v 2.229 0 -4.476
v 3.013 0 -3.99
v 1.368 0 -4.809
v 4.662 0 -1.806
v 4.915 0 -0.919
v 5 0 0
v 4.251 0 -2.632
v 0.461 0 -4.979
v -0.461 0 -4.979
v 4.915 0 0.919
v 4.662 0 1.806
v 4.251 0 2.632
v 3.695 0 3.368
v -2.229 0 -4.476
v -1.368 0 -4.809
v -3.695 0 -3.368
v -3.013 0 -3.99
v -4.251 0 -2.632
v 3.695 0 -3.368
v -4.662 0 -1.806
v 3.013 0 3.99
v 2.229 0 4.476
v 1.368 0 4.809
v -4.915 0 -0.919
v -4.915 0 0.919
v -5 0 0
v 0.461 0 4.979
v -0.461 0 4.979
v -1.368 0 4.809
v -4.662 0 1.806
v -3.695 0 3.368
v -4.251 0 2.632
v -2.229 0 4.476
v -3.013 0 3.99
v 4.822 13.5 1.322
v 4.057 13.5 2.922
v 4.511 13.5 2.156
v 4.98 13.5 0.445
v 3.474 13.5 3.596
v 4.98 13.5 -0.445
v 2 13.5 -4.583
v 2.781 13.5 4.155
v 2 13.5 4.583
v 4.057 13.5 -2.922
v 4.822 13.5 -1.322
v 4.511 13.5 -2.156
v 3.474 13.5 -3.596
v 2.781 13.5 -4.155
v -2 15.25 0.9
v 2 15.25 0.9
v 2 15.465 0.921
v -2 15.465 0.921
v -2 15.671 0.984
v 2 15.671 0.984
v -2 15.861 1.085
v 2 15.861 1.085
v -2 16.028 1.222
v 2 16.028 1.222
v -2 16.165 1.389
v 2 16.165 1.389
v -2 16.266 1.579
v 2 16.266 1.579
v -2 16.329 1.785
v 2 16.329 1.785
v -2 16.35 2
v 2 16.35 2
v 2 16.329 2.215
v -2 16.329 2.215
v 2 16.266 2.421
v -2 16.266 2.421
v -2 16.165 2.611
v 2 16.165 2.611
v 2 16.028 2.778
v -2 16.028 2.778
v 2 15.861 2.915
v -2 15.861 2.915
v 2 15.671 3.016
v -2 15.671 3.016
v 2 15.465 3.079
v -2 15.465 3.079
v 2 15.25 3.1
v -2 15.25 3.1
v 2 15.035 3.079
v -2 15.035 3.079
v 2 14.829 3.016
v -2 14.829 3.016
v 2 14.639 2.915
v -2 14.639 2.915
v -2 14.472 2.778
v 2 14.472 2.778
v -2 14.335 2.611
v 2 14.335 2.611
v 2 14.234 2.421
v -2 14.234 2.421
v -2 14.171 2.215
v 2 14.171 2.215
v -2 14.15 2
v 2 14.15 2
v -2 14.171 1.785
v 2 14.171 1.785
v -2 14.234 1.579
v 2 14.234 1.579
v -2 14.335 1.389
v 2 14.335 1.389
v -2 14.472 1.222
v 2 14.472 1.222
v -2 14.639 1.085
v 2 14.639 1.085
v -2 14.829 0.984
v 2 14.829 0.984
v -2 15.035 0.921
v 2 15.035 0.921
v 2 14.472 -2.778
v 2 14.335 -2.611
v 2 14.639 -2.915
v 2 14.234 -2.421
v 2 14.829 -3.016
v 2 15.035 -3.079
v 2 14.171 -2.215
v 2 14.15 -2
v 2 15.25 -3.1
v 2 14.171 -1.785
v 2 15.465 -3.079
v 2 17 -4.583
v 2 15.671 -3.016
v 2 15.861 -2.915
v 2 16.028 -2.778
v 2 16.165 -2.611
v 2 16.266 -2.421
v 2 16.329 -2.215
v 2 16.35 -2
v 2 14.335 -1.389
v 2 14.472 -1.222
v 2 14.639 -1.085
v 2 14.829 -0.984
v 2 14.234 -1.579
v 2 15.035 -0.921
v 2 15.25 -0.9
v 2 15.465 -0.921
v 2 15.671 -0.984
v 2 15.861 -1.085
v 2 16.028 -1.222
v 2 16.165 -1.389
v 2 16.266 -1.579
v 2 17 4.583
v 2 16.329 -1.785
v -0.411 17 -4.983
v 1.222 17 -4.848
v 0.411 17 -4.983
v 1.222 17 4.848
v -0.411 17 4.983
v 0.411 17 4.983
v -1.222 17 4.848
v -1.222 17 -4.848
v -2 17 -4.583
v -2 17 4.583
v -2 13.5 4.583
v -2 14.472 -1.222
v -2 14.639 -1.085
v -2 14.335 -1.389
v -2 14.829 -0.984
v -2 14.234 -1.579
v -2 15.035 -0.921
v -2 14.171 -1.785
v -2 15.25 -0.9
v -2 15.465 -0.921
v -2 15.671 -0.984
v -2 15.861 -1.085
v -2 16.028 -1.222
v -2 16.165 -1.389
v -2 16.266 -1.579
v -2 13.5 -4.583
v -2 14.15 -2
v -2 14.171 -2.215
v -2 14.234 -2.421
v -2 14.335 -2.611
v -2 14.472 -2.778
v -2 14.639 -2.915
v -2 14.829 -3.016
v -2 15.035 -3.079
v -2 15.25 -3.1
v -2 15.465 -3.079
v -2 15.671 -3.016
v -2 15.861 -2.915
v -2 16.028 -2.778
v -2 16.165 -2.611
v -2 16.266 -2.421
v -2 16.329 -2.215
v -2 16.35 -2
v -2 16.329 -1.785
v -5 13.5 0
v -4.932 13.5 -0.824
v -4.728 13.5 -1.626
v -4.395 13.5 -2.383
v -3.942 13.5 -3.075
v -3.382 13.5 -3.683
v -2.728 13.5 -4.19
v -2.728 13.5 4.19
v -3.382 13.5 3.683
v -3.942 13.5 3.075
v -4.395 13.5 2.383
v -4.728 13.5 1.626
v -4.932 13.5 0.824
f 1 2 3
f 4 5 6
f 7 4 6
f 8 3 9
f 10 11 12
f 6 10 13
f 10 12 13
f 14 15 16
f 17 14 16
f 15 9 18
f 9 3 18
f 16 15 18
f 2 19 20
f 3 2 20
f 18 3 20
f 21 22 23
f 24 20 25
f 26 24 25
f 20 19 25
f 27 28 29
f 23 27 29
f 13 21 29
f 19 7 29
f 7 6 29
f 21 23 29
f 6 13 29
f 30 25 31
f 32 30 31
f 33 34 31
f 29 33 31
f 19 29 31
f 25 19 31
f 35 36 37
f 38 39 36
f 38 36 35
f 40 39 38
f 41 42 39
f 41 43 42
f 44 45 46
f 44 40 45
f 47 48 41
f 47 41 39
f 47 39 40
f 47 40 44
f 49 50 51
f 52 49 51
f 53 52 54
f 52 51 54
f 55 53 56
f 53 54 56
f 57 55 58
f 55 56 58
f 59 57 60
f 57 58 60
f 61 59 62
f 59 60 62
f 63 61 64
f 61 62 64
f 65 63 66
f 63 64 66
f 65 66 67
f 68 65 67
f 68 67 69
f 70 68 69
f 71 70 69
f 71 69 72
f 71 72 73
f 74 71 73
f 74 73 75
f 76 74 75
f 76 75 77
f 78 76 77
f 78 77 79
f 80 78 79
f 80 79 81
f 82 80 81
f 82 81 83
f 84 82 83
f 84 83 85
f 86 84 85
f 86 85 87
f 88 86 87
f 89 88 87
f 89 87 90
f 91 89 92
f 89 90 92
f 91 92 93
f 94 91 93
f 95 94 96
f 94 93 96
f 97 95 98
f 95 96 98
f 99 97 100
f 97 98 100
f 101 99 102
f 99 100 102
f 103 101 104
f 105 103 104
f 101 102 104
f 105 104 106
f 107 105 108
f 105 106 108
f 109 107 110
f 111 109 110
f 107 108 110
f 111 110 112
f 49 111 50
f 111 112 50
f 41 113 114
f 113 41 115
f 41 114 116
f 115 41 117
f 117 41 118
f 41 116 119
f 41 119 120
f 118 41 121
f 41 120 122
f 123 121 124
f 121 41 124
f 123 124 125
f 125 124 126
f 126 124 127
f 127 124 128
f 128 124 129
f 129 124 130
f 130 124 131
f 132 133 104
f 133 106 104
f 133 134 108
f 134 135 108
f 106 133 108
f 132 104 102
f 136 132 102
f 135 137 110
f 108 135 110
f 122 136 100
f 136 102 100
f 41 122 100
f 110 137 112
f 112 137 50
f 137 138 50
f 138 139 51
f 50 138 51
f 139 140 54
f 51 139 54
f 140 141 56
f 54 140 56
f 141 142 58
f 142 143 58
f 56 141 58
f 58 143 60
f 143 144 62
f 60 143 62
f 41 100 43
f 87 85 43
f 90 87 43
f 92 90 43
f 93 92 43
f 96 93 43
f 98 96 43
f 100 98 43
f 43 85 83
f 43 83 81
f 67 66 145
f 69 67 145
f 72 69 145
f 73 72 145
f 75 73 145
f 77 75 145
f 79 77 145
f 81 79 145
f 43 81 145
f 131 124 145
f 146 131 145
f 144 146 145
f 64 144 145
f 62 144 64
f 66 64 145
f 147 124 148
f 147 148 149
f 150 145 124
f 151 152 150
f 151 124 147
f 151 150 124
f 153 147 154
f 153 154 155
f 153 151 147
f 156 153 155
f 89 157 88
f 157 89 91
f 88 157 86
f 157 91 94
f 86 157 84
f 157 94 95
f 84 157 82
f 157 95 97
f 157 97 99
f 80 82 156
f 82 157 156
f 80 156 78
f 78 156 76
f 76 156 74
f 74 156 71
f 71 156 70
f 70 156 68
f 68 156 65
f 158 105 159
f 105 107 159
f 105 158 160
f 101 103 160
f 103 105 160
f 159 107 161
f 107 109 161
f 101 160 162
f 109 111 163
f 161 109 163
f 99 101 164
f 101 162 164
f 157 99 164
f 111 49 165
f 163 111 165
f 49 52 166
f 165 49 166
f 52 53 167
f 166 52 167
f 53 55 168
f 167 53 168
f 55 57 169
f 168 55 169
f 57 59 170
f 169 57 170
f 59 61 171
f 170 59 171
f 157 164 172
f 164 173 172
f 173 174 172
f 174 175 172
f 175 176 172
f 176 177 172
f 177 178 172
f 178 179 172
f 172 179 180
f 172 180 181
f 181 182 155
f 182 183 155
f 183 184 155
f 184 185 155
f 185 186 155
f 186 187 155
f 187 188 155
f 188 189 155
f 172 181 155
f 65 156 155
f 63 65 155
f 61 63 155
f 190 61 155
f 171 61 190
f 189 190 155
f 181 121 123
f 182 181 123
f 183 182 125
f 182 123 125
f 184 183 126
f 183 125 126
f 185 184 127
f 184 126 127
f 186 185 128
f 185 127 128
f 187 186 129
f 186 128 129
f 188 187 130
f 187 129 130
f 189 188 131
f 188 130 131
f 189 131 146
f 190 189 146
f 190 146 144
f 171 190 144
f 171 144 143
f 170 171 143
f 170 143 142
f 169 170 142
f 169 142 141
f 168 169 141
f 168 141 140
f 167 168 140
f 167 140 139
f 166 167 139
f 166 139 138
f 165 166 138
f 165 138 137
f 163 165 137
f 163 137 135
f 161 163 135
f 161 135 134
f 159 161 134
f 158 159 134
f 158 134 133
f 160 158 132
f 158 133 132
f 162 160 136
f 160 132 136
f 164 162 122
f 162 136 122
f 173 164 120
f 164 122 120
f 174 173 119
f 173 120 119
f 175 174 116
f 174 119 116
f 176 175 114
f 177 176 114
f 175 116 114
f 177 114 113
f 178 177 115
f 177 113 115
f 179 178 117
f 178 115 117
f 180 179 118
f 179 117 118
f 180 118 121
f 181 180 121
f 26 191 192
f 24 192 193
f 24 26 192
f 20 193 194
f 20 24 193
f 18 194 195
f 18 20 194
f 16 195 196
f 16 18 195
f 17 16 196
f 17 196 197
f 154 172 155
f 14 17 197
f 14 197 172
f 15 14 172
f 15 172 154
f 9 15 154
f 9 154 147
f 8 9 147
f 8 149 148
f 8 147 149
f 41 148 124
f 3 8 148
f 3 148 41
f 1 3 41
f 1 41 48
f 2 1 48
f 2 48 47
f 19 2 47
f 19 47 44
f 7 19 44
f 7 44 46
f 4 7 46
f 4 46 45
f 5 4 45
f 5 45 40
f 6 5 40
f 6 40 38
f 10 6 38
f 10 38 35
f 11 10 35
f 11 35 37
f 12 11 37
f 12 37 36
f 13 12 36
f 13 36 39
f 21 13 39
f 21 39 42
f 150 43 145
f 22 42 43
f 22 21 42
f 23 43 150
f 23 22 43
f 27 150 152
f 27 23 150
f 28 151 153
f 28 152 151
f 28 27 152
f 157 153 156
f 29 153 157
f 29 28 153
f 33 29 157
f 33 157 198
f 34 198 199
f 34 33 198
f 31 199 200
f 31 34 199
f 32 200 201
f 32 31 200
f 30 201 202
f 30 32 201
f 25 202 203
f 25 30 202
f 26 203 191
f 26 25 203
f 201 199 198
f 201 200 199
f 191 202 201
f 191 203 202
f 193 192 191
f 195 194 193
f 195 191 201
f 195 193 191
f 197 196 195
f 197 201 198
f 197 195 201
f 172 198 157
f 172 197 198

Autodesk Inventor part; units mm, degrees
ref_plane "YZ Plane" through (0, 0, 0) normal (1, 0, 0) x (0, 1, 0)
ref_plane "XZ Plane" through (0, 0, 0) normal (0, 1, 0) x (-1, 0, 0)
ref_plane "XY Plane" through (0, 0, 0) normal (0, 0, 1) x (1, 0, 0)
sketch "Sketch1" plane through (0, 0, 0) normal (0, 1, 0) x (-1, 0, 0)
  circle A0 centre (0, 0) radius 5
  dimension "d0" = 10
extrude "Extrusion1" add sketch "Sketch1" along normal blind 17
sketch "Sketch2" plane through (0, 17, 0) normal (0, 1, 0) x (1, 0, 0)
  line L0 (0, 0) -> (-2, 0)
  line L1 (-2, 0) -> (-2, 7.2521)
  line L2 (0, 0) -> (2, 0)
  line L3 (2, 0) -> (2, -7.0492)
  line L4 (2, -7.0492) -> (-2, -7.0492)
  line L5 (-2, -7.0492) -> (-2, 7.2521)
  line L6 (-2, 7.2521) -> (2, 7.2521)
  line L7 (2, 7.2521) -> (2, -7.0492)
  line L8 (-2, -7.0492) -> (-8.2773, -7.0492)
  line L9 (-8.2773, -7.0492) -> (-8.2773, 7.6578)
  line L10 (-8.2773, 7.6578) -> (-2, 7.6578)
  line L11 (-2, 7.6578) -> (-2, -7.0492)
  line L12 (2, 7.2521) -> (6.5688, 7.2521)
  line L13 (6.5688, 7.2521) -> (6.5688, -6.4823)
  line L14 (6.5688, -6.4823) -> (2, -6.4823)
  line L15 (2, -6.4823) -> (2, 7.2521)
  dimension "d3" = 2
  dimension "d4" = 2
extrude "Extrusion2" cut sketch "Sketch2" against normal blind 3.5 contours L5 L8 L9 L10 L11 L1 | L7 L12 L13 L14 L3
sketch "Sketch3" plane through (2, 17, 4.5826) normal (1, 0, 0) x (0, 0, -1)
  line L0 (9.1652, 0) -> (0, 0) projected
  line L1 (4.5826, 0) -> (4.5826, -1.75)
  line L2 (4.5826, -1.75) -> (2.5826, -1.75)
  line L3 (4.5826, -1.75) -> (6.5826, -1.75)
  circle A0 centre (2.5826, -1.75) radius 1.1
  circle A1 centre (6.5826, -1.75) radius 1.1
  point P0 (4.5826, -17)
  dimension "d7" = 1.75
  dimension "d8" = 2
  dimension "d9" = 2
  dimension "d10" = 2.2
  dimension "d11" = 2.2
extrude "Extrusion3" cut sketch "Sketch3" against normal blind 56
properties part number "drive_shaft_v4"
